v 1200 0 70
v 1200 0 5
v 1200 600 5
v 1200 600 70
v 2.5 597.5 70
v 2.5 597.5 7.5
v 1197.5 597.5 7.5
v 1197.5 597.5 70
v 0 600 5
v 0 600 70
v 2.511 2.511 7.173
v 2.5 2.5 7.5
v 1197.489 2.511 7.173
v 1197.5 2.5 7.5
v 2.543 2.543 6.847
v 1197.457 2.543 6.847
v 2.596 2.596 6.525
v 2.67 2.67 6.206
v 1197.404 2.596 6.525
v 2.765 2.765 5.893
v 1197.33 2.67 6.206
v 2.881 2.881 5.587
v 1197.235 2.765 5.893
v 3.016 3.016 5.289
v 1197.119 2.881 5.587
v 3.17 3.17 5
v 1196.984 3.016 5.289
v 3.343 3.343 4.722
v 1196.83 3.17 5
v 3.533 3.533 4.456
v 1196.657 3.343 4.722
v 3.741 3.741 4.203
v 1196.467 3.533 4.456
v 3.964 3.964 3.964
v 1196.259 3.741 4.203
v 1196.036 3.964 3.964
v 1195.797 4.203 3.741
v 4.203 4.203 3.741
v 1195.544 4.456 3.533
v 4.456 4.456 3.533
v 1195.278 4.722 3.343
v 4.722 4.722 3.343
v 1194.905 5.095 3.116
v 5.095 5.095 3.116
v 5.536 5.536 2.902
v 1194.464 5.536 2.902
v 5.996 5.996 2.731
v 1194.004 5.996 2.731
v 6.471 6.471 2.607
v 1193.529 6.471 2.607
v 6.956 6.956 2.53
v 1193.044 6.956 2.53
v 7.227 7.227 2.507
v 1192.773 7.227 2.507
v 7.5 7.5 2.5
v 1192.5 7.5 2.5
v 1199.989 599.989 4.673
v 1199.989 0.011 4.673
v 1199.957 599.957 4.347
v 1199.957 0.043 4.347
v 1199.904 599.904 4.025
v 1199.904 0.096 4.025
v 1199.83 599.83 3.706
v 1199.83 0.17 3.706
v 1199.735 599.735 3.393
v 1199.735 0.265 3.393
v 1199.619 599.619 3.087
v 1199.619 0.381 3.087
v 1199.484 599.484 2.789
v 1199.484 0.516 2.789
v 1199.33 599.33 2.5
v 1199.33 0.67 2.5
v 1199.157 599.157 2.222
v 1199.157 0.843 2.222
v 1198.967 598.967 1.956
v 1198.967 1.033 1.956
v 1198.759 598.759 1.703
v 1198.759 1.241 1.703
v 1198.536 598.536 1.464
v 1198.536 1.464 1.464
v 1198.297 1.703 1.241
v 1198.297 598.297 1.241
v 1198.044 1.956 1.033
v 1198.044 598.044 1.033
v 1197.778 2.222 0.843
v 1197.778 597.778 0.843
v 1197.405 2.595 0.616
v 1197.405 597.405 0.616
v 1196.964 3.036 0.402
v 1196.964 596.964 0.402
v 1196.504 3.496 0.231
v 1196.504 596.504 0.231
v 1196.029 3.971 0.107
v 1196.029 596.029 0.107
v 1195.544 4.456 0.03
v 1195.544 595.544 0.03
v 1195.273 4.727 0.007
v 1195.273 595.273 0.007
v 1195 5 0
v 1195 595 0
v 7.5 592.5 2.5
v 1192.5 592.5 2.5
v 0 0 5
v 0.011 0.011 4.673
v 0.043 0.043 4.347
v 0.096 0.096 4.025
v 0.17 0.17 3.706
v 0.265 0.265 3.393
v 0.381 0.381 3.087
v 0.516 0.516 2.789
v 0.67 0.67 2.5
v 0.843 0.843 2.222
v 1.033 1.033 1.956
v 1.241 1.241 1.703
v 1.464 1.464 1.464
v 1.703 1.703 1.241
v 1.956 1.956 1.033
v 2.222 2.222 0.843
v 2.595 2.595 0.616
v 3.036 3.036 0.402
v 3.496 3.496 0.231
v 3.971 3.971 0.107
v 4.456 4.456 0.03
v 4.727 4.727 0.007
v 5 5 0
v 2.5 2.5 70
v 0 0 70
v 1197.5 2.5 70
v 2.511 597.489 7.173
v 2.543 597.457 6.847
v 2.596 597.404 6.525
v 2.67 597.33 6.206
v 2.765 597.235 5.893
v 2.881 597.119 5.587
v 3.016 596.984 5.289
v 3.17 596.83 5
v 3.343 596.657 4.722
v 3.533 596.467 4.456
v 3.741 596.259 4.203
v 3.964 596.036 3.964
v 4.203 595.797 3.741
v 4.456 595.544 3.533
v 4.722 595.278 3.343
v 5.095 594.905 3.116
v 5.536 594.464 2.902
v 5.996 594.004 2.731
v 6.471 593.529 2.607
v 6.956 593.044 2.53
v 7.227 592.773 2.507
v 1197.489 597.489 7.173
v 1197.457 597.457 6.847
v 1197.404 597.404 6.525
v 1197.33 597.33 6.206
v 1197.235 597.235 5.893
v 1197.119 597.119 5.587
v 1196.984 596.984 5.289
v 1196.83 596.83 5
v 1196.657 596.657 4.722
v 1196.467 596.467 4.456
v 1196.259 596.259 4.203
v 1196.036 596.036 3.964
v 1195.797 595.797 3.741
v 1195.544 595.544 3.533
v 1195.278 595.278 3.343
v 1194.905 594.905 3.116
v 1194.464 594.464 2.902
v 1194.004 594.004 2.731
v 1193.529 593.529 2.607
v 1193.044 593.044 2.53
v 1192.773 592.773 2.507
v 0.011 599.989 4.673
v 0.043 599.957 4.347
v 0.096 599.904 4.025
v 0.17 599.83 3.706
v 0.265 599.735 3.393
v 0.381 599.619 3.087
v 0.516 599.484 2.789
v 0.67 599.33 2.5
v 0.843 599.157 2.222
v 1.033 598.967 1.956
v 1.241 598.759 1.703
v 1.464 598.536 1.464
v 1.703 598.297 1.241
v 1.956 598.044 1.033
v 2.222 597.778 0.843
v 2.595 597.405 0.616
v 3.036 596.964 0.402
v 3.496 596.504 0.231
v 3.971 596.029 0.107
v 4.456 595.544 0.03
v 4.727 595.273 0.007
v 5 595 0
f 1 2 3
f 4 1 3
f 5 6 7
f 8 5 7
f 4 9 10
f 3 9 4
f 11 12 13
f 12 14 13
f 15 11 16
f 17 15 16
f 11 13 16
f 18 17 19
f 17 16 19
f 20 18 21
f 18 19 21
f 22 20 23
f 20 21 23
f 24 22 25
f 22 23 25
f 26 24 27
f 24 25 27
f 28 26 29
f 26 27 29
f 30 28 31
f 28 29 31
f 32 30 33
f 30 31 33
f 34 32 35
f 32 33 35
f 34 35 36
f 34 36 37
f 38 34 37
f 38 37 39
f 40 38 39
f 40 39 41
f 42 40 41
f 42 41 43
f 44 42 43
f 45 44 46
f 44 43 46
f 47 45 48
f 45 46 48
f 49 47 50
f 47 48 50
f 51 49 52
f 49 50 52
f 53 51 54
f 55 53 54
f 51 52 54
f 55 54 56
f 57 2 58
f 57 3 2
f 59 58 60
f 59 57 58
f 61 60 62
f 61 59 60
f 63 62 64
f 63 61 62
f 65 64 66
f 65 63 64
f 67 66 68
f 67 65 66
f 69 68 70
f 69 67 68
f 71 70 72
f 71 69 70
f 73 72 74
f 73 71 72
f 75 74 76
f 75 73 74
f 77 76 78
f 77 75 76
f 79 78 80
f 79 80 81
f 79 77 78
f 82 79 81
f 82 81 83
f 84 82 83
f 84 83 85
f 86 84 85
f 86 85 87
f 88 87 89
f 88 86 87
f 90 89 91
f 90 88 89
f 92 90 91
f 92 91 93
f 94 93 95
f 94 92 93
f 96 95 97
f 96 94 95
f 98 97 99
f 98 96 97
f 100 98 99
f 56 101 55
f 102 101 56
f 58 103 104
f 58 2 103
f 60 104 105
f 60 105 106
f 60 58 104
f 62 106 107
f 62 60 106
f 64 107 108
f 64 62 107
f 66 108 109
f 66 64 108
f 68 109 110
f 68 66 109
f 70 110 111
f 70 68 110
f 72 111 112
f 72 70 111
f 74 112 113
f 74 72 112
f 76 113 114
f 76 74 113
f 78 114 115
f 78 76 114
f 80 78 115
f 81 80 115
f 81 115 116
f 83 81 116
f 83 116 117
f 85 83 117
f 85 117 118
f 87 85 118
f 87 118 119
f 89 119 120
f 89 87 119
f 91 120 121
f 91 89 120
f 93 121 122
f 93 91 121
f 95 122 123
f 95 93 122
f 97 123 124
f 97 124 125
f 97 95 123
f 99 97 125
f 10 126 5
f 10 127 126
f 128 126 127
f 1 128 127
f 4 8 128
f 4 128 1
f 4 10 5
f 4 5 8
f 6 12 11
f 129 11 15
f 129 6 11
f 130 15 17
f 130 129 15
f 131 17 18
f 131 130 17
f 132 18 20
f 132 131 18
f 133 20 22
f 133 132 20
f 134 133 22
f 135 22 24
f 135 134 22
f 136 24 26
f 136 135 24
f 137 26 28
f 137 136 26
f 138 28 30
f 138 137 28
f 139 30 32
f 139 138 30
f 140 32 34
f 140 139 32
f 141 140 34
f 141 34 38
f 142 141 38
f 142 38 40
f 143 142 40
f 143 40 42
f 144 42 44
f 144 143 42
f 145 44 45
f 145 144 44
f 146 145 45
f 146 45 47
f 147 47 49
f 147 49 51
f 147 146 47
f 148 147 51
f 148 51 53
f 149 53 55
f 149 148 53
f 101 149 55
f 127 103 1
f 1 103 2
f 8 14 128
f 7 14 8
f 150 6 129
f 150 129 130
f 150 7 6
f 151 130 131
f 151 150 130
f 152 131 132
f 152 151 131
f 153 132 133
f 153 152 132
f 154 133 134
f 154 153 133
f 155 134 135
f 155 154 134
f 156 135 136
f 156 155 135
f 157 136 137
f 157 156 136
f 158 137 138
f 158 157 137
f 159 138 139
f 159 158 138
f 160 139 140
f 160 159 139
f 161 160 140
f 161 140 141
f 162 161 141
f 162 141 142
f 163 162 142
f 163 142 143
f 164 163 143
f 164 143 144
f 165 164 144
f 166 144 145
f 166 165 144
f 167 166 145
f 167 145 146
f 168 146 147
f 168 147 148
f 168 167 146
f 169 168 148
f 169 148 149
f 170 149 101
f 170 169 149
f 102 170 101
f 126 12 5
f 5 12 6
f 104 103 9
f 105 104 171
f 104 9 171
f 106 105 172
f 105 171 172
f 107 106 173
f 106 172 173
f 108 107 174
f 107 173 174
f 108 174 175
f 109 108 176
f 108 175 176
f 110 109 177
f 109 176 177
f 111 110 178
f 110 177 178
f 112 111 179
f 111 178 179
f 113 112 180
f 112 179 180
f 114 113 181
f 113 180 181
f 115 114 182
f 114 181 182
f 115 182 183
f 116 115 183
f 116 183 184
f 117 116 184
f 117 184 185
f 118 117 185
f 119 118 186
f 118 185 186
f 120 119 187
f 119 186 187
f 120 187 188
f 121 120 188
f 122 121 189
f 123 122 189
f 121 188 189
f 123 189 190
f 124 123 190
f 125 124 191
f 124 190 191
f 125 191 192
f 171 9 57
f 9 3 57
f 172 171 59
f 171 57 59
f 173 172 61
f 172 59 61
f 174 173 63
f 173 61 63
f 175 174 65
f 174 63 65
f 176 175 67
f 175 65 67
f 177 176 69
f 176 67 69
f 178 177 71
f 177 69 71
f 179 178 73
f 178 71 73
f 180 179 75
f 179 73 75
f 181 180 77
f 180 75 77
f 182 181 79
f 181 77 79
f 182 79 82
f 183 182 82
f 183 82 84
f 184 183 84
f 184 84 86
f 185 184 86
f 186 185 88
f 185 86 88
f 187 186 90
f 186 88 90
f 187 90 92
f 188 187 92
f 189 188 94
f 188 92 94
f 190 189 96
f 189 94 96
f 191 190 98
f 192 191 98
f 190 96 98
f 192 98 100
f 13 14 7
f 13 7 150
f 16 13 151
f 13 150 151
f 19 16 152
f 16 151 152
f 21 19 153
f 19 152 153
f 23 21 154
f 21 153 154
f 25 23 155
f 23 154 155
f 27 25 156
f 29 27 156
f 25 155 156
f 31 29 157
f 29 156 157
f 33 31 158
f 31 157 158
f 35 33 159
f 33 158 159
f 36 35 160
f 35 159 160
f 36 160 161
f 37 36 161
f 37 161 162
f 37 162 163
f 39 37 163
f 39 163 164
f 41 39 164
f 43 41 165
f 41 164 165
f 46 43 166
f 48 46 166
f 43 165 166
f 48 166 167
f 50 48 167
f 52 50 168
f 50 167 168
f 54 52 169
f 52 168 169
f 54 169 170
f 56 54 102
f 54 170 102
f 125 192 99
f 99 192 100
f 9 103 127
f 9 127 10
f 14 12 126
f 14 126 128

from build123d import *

# Parameters (mm, degrees)
F0_W     = 1200
F0_H     = 600
F1_DEPTH = 70
F2_T     = -2.5
F3_R     = 5
F4_R     = 5


with BuildPart() as f1:
    # F0 (on Top) → F1 (new body)
    with BuildSketch(Plane.XY):
        with Locations((600, 300)):
            Rectangle(F0_W, F0_H)
    extrude(amount=F1_DEPTH)

    # F2
    f2_openings = [f1.faces().sort_by_distance(p)[0] for p in [
        (600, 300, 70),
    ]]
    offset(amount=F2_T, openings=f2_openings)

    # F3
    f3_edges = [f1.edges().sort_by_distance(p)[0] for p in [
        (0, 300, 0),
        (600, 0, 0),
        (1200, 300, 0),
        (600, 600, 0),
    ]]
    fillet(f3_edges, radius=F3_R)

    # F4
    f4_edges = [f1.edges().sort_by_distance(p)[0] for p in [
        (2.5, 300, 2.5),
        (600, 2.5, 2.5),
        (1197.5, 300, 2.5),
        (600, 597.5, 2.5),
    ]]
    fillet(f4_edges, radius=F4_R)


solid = f1.part
